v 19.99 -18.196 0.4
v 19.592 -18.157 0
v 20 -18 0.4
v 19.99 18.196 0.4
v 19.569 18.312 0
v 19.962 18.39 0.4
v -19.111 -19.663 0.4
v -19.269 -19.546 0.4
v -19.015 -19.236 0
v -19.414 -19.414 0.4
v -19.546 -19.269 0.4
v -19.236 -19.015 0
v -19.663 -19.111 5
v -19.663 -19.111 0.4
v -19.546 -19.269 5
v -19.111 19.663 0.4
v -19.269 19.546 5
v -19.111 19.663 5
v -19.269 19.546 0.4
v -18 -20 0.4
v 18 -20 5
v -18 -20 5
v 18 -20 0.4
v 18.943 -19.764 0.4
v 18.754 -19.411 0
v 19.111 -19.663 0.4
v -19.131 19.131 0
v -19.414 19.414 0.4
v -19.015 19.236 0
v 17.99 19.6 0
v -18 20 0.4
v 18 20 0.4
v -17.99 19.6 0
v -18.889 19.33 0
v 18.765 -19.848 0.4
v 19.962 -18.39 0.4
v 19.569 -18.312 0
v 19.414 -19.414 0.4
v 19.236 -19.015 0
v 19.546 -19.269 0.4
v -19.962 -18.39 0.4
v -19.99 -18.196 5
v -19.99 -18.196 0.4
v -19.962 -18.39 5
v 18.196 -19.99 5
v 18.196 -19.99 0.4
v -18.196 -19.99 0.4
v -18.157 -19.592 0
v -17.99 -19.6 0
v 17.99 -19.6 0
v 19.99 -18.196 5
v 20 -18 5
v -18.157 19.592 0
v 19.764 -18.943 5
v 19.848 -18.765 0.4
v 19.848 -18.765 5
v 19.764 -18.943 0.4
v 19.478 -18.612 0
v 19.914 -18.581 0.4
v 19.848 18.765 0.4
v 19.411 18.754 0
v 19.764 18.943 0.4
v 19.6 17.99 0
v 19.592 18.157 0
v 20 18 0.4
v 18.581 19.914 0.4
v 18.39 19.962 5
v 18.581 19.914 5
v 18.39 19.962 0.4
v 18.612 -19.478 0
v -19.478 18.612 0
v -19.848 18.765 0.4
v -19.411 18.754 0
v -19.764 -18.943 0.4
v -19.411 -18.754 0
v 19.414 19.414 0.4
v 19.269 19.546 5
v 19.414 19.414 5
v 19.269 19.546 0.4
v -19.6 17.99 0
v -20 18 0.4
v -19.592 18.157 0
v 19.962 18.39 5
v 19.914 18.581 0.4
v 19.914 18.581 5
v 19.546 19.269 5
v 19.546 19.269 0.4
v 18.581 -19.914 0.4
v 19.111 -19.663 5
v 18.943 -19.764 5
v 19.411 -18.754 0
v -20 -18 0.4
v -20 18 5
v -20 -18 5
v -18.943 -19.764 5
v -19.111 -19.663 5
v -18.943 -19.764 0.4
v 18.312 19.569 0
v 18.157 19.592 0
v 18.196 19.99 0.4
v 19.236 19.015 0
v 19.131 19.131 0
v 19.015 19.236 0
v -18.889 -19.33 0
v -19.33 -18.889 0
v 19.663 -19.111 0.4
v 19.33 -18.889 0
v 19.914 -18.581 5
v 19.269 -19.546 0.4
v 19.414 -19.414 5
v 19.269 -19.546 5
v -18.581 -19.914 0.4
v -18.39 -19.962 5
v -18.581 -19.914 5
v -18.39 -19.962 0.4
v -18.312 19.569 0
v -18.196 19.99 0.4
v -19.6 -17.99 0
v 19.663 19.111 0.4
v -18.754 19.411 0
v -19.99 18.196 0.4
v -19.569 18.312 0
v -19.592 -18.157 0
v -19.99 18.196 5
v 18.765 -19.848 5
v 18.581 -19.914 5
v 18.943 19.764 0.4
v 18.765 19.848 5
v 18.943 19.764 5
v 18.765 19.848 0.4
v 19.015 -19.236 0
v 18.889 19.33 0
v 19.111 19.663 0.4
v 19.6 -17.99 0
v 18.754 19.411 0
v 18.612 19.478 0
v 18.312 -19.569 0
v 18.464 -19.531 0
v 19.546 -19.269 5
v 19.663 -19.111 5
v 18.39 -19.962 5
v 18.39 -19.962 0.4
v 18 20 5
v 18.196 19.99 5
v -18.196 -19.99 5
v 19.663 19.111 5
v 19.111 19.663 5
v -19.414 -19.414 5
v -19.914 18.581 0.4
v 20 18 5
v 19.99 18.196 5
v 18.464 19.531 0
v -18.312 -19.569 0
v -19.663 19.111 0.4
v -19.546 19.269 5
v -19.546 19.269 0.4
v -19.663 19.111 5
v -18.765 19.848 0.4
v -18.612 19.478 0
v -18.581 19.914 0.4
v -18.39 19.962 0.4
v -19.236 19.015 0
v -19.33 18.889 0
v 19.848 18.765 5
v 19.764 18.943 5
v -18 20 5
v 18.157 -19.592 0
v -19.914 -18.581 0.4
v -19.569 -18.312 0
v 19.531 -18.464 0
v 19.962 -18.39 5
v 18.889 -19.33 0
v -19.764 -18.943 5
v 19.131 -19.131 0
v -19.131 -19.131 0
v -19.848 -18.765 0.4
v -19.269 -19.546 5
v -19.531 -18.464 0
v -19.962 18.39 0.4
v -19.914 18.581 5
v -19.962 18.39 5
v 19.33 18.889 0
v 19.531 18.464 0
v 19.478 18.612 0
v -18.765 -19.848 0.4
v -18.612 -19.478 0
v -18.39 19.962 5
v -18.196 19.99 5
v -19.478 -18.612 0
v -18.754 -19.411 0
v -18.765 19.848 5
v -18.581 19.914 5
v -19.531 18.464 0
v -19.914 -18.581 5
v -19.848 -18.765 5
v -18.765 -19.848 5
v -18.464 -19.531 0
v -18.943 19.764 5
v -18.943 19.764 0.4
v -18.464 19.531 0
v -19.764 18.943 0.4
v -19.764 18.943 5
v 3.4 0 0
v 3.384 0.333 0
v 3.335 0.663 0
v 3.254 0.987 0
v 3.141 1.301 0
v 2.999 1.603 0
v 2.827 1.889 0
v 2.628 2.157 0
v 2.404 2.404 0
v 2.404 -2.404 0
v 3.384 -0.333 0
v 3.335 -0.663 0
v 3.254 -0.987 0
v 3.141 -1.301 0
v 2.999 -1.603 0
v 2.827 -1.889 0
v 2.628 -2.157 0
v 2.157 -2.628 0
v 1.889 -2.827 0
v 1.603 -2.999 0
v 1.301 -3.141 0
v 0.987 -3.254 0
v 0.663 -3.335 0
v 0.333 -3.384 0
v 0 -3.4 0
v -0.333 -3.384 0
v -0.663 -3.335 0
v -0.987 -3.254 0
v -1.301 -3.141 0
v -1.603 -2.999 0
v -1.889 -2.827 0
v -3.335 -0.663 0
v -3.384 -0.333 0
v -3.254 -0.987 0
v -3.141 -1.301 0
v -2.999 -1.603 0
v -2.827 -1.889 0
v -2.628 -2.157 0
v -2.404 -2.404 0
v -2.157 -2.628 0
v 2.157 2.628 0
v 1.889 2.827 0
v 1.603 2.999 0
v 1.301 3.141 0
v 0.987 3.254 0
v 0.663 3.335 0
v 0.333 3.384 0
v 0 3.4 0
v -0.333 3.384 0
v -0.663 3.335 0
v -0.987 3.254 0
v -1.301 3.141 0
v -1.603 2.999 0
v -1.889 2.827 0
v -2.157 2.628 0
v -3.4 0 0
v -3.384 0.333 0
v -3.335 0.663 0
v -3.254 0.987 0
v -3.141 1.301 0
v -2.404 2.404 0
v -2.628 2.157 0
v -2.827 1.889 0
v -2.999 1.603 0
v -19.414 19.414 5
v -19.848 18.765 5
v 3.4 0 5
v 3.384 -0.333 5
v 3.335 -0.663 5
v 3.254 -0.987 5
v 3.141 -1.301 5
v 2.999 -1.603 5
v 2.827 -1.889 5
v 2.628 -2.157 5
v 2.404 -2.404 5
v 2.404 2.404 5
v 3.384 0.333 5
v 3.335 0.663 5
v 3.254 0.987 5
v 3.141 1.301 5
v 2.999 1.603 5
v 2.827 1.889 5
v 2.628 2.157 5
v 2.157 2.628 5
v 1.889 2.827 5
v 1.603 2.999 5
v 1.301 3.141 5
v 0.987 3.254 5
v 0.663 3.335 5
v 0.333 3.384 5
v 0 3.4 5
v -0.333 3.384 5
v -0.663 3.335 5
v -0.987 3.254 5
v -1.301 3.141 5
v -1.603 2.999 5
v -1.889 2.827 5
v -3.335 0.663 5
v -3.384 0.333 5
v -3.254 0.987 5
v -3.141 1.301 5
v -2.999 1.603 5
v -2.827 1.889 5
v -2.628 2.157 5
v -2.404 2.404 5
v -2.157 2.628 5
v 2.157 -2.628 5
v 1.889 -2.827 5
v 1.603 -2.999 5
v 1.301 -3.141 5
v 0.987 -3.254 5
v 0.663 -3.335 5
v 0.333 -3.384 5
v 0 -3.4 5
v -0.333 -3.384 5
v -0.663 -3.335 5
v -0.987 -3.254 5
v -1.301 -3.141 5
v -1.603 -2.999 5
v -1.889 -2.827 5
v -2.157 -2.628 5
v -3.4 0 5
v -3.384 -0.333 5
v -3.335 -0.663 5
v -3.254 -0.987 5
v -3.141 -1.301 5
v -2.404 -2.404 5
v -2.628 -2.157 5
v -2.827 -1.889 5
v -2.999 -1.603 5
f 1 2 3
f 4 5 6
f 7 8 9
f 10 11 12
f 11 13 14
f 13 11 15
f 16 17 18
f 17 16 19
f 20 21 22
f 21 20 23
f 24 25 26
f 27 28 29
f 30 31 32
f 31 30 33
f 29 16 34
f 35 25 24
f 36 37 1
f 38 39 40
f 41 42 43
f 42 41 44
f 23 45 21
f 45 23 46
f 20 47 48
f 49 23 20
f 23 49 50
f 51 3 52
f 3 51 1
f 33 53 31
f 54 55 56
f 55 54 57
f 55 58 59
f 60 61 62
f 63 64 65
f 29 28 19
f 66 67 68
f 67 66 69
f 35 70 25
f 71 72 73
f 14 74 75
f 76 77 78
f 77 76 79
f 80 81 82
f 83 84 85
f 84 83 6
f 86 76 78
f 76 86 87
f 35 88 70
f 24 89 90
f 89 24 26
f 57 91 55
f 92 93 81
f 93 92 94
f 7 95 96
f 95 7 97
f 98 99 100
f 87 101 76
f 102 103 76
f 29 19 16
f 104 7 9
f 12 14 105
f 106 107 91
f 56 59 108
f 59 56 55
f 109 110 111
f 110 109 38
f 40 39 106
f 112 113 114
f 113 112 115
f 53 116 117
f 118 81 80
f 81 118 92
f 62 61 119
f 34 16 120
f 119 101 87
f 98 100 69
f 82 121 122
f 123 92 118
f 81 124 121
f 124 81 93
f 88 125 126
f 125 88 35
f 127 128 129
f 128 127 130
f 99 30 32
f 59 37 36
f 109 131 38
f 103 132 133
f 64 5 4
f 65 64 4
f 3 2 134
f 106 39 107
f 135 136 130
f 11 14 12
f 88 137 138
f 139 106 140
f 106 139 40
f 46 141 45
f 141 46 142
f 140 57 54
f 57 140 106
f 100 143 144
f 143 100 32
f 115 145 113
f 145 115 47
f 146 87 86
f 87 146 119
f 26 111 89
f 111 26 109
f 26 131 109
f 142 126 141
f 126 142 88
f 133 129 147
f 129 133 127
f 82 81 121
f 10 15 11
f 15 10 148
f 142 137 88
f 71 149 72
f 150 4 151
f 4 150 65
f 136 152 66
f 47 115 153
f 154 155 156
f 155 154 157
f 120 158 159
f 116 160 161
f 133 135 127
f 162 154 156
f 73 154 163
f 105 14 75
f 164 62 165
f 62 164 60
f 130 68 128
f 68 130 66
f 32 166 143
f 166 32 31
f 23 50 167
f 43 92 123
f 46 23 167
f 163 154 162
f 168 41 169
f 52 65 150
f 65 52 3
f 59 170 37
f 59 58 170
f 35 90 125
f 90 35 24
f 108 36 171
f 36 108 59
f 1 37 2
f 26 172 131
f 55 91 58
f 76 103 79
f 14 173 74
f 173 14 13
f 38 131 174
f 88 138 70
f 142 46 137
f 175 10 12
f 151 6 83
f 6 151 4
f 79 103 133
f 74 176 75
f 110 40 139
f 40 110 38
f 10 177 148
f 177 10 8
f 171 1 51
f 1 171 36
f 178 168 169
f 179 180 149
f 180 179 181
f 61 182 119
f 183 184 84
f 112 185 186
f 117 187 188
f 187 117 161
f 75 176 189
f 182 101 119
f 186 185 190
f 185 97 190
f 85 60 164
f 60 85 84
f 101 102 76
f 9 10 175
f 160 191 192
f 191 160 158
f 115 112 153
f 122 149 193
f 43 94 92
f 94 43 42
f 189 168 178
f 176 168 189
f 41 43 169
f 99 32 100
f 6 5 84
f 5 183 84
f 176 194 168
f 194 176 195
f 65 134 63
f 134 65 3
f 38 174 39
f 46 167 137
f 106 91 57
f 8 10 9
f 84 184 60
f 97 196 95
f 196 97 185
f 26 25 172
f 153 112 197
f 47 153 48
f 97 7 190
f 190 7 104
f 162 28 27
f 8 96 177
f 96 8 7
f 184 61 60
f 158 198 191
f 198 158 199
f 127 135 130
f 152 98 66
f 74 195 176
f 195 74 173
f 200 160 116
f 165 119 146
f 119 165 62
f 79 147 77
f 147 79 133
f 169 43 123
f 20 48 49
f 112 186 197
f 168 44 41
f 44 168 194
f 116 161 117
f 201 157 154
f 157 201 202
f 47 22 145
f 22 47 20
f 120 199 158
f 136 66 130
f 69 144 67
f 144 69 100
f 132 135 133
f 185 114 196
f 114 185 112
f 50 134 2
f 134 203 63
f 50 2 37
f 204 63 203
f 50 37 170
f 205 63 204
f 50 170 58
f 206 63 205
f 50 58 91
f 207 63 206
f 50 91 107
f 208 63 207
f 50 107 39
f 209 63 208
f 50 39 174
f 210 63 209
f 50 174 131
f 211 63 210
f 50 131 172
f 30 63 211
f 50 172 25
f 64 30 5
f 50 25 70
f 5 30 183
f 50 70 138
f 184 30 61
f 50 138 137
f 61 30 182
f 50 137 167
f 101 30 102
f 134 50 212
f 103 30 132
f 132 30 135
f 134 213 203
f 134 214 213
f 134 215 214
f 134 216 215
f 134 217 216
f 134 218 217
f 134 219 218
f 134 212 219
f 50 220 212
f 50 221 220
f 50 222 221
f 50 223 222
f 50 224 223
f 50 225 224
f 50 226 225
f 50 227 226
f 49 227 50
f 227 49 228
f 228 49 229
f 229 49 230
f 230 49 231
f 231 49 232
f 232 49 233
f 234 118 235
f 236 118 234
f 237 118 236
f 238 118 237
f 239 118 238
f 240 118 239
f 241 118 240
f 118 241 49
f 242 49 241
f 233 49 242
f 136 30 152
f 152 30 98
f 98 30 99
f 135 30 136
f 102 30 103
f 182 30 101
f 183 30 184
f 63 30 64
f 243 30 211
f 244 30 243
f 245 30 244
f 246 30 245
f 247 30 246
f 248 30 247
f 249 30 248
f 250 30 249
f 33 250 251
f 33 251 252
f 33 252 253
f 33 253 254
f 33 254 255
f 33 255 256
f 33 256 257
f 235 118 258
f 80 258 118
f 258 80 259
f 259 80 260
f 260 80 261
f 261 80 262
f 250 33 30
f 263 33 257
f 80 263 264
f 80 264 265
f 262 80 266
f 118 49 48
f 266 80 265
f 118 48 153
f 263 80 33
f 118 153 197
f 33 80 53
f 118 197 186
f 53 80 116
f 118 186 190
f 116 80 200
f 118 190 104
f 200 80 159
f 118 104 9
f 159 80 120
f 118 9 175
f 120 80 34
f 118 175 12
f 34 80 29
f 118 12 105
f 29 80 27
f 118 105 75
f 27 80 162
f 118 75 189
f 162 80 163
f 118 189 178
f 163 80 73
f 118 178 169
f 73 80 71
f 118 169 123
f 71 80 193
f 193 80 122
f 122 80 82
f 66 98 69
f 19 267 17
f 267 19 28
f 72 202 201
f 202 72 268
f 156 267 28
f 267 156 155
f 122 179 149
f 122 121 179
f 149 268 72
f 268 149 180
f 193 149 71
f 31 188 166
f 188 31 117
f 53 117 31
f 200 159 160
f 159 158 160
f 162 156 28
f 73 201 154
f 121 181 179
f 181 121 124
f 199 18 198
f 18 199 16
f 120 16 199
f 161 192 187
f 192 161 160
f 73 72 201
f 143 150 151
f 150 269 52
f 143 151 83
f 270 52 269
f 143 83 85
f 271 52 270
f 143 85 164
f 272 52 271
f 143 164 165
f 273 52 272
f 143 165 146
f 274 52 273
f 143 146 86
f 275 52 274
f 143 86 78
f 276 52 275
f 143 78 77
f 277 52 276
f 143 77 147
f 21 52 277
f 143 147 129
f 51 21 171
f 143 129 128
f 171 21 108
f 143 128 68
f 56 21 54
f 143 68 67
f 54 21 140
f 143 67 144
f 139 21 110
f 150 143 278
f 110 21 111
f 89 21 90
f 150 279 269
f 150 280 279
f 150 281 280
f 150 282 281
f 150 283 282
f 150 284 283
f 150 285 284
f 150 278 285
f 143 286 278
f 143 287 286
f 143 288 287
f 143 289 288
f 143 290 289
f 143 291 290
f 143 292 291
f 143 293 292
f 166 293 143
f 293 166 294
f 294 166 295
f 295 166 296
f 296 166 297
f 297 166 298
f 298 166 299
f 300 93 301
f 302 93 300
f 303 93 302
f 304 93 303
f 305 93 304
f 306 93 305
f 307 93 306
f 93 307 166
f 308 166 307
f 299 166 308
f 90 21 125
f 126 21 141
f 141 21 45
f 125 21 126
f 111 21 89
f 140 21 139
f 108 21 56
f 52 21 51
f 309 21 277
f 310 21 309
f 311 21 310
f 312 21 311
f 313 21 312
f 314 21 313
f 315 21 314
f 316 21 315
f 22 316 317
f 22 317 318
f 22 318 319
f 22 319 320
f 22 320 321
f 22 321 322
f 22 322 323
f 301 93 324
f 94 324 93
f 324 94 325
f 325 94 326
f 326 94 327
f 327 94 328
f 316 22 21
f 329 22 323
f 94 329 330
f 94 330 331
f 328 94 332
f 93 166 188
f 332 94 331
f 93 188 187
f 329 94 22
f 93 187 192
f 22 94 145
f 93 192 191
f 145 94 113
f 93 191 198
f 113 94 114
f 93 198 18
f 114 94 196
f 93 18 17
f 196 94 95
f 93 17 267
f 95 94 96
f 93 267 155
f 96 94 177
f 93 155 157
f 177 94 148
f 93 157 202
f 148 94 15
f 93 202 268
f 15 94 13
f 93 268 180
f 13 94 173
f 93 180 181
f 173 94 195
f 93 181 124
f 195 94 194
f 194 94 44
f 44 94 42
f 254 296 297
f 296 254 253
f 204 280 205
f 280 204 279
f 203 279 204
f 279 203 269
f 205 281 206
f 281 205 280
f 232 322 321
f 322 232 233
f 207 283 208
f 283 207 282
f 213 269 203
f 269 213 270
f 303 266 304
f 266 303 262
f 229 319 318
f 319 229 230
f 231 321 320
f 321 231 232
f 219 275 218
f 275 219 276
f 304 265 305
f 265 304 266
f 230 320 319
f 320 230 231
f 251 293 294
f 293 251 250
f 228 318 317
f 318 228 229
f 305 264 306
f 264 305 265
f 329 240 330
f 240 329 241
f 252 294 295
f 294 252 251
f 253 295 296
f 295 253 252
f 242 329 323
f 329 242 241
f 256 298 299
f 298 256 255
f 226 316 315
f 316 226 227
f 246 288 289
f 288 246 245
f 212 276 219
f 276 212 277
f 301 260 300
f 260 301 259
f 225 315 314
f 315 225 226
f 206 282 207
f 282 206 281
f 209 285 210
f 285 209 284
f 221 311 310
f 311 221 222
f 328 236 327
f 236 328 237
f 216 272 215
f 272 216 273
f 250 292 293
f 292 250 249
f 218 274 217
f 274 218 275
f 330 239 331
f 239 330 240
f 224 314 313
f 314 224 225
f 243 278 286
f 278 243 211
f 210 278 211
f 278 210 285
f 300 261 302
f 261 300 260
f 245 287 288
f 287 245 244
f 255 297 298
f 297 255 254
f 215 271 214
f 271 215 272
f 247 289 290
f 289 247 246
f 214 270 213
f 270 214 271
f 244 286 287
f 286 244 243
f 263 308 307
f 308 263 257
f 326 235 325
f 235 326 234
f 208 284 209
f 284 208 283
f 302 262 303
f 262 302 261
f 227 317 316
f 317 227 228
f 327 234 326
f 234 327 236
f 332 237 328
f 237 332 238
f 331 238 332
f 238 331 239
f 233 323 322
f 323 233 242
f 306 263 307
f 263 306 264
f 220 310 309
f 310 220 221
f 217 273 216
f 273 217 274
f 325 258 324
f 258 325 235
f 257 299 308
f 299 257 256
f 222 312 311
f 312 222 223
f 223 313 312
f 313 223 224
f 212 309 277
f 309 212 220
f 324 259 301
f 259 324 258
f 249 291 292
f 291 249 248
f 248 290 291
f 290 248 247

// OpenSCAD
// PART: 40x40x5 Spacer Plate with 6.6mm Hole
// KIND: mechanical
// PRINT: Flat on bed (XY plane), no supports required, PLA/PETG
// NOTE: Outer dimensions are 40x40x5 mm with 2mm rounded corners.
// NOTE: Center hole is oversized by +0.2mm (6.8mm total) to compensate for FDM hole shrinkage and yield a precise 6.6mm inner diameter.
// NOTE: Bottom outer edge includes a 0.4mm chamfer to prevent elephant foot adhesion spreading.

plate_length = 40.0; // Outer plate length along X axis in mm
plate_width = 40.0; // Outer plate width along Y axis in mm
plate_height = 5.0; // Total plate thickness along Z axis in mm
hole_diameter_nominal = 6.6; // Desired clear hole diameter in mm
hole_compensation = 0.2; // FDM hole shrink compensation in mm
corner_bevel = 2.0; // Corner rounding radius in mm
bottom_chamfer = 0.4; // Bottom outer edge chamfer size in mm

// --- end parameters ---

$fn = 64;

// SPEC-BEGIN
// {"name":"spacer_plate","size_mm":[40,40,5],
//  "parts":[{"name":"plate_body","role":"main spacer body with centered bolt hole","size_mm":[40,40,5]}],
//  "joints":[],
//  "proportions":[],
//  "layout":[],
//  "profile":[]}
// SPEC-END

module outer_profile_2d() {
    offset(r = corner_bevel) {
        square([plate_length - 2 * corner_bevel, plate_width - 2 * corner_bevel], center = true);
    }
}

module plate_body() {
    hole_d = hole_diameter_nominal + hole_compensation;
    difference() {
        union() {
            // Chamfered bottom section to prevent elephant foot
            hull() {
                translate([0, 0, 0])
                    linear_extrude(height = 0.01)
                        offset(delta = -bottom_chamfer)
                            outer_profile_2d();
                translate([0, 0, bottom_chamfer])
                    linear_extrude(height = 0.01)
                        outer_profile_2d();
            }
            // Vertical main body
            translate([0, 0, bottom_chamfer])
                linear_extrude(height = plate_height - bottom_chamfer)
                    outer_profile_2d();
        }
        // Centered clearance hole
        translate([0, 0, -1])
            cylinder(d = hole_d, h = plate_height + 2);
    }
}

module main() {
    plate_body();
}

main();
